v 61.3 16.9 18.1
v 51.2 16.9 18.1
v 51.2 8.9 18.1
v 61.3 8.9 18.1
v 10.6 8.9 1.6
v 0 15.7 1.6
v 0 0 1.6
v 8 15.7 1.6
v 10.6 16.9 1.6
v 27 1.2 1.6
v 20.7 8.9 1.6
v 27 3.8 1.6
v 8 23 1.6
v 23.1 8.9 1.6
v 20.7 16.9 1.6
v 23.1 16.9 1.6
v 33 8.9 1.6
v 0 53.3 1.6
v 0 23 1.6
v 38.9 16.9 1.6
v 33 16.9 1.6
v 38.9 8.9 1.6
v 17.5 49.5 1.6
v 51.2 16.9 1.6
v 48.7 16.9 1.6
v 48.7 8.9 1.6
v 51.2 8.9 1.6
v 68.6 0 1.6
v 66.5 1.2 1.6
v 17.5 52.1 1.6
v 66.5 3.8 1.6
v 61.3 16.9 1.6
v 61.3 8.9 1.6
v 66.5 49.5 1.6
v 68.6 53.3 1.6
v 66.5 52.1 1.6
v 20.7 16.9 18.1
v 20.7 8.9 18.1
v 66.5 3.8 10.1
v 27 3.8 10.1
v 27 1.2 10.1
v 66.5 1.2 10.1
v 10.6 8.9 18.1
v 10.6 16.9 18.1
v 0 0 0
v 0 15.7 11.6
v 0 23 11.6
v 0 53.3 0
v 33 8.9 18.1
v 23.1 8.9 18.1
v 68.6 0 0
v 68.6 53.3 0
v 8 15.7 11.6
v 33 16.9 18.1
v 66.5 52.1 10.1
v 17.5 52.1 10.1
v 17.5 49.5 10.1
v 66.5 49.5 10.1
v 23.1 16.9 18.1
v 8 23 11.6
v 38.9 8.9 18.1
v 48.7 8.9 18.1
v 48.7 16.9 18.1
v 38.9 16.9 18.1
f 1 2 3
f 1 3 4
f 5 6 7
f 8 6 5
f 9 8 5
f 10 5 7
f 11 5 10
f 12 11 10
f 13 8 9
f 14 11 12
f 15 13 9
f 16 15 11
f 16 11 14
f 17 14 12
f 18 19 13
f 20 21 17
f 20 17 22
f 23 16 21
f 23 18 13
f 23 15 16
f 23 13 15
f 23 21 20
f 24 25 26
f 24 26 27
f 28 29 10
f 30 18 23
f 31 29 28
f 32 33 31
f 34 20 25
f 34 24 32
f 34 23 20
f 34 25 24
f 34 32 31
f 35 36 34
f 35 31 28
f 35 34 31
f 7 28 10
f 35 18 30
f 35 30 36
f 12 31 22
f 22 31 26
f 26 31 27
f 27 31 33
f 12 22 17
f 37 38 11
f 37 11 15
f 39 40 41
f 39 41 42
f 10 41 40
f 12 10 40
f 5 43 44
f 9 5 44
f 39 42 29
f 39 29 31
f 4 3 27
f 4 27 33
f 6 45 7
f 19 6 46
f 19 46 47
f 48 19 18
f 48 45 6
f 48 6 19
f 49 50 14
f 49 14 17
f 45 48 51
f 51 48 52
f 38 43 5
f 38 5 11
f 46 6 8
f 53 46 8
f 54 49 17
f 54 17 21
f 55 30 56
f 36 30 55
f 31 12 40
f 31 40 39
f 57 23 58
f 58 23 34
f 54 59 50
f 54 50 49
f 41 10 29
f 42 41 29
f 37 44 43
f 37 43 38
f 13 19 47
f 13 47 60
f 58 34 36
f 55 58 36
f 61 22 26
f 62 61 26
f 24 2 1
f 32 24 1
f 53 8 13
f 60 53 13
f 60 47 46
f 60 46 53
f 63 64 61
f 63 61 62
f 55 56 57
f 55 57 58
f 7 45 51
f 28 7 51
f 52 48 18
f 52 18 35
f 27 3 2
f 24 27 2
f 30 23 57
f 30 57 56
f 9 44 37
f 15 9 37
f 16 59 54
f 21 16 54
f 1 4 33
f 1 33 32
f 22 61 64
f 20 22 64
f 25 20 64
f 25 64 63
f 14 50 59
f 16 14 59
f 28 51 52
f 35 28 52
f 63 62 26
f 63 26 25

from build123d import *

# Parameters (mm, degrees)
SKETCH1_W           = 68.6
SKETCH1_H           = 53.3
BOSS_EXTRUDE1_DEPTH = 1.6
SKETCH2_W           = 10.1
SKETCH2_H           = 8
SKETCH2_W_2         = 9.9
SKETCH2_W_3         = 9.8
BOSS_EXTRUDE2_DEPTH = 18.1
SKETCH3_W           = 8
SKETCH3_H           = 7.3
BOSS_EXTRUDE3_DEPTH = 11.6
SKETCH4_W           = 49
SKETCH4_H           = 2.6
SKETCH4_W_2         = 39.5
BOSS_EXTRUDE4_DEPTH = 10.1


with BuildPart() as part:
    # Sketch1 → Boss-Extrude1 (new body)
    with BuildSketch(Plane.XY):
        with Locations((34.3, 26.65)):
            Rectangle(SKETCH1_W, SKETCH1_H)
    extrude(amount=BOSS_EXTRUDE1_DEPTH)

    # Sketch2 → Boss-Extrude2 (add)
    with BuildSketch(Plane.XY):
        with Locations((15.65, 12.9)):
            Rectangle(SKETCH2_W, SKETCH2_H)
        with Locations((28.05, 12.9)):
            Rectangle(SKETCH2_W_2, SKETCH2_H)
        with Locations((43.8, 12.9)):
            Rectangle(SKETCH2_W_3, SKETCH2_H)
        with Locations((56.25, 12.9)):
            Rectangle(SKETCH2_W, SKETCH2_H)
    extrude(amount=BOSS_EXTRUDE2_DEPTH)

    # Sketch3 → Boss-Extrude3 (add)
    with BuildSketch(Plane.XY):
        with Locations((4, 19.35)):
            Rectangle(SKETCH3_W, SKETCH3_H)
    extrude(amount=BOSS_EXTRUDE3_DEPTH)

    # Sketch4 → Boss-Extrude4 (add)
    with BuildSketch(Plane.XY):
        with Locations((42, 50.8)):
            Rectangle(SKETCH4_W, SKETCH4_H)
        with Locations((46.75, 2.5)):
            Rectangle(SKETCH4_W_2, SKETCH4_H)
    extrude(amount=BOSS_EXTRUDE4_DEPTH)


solid = part.part
